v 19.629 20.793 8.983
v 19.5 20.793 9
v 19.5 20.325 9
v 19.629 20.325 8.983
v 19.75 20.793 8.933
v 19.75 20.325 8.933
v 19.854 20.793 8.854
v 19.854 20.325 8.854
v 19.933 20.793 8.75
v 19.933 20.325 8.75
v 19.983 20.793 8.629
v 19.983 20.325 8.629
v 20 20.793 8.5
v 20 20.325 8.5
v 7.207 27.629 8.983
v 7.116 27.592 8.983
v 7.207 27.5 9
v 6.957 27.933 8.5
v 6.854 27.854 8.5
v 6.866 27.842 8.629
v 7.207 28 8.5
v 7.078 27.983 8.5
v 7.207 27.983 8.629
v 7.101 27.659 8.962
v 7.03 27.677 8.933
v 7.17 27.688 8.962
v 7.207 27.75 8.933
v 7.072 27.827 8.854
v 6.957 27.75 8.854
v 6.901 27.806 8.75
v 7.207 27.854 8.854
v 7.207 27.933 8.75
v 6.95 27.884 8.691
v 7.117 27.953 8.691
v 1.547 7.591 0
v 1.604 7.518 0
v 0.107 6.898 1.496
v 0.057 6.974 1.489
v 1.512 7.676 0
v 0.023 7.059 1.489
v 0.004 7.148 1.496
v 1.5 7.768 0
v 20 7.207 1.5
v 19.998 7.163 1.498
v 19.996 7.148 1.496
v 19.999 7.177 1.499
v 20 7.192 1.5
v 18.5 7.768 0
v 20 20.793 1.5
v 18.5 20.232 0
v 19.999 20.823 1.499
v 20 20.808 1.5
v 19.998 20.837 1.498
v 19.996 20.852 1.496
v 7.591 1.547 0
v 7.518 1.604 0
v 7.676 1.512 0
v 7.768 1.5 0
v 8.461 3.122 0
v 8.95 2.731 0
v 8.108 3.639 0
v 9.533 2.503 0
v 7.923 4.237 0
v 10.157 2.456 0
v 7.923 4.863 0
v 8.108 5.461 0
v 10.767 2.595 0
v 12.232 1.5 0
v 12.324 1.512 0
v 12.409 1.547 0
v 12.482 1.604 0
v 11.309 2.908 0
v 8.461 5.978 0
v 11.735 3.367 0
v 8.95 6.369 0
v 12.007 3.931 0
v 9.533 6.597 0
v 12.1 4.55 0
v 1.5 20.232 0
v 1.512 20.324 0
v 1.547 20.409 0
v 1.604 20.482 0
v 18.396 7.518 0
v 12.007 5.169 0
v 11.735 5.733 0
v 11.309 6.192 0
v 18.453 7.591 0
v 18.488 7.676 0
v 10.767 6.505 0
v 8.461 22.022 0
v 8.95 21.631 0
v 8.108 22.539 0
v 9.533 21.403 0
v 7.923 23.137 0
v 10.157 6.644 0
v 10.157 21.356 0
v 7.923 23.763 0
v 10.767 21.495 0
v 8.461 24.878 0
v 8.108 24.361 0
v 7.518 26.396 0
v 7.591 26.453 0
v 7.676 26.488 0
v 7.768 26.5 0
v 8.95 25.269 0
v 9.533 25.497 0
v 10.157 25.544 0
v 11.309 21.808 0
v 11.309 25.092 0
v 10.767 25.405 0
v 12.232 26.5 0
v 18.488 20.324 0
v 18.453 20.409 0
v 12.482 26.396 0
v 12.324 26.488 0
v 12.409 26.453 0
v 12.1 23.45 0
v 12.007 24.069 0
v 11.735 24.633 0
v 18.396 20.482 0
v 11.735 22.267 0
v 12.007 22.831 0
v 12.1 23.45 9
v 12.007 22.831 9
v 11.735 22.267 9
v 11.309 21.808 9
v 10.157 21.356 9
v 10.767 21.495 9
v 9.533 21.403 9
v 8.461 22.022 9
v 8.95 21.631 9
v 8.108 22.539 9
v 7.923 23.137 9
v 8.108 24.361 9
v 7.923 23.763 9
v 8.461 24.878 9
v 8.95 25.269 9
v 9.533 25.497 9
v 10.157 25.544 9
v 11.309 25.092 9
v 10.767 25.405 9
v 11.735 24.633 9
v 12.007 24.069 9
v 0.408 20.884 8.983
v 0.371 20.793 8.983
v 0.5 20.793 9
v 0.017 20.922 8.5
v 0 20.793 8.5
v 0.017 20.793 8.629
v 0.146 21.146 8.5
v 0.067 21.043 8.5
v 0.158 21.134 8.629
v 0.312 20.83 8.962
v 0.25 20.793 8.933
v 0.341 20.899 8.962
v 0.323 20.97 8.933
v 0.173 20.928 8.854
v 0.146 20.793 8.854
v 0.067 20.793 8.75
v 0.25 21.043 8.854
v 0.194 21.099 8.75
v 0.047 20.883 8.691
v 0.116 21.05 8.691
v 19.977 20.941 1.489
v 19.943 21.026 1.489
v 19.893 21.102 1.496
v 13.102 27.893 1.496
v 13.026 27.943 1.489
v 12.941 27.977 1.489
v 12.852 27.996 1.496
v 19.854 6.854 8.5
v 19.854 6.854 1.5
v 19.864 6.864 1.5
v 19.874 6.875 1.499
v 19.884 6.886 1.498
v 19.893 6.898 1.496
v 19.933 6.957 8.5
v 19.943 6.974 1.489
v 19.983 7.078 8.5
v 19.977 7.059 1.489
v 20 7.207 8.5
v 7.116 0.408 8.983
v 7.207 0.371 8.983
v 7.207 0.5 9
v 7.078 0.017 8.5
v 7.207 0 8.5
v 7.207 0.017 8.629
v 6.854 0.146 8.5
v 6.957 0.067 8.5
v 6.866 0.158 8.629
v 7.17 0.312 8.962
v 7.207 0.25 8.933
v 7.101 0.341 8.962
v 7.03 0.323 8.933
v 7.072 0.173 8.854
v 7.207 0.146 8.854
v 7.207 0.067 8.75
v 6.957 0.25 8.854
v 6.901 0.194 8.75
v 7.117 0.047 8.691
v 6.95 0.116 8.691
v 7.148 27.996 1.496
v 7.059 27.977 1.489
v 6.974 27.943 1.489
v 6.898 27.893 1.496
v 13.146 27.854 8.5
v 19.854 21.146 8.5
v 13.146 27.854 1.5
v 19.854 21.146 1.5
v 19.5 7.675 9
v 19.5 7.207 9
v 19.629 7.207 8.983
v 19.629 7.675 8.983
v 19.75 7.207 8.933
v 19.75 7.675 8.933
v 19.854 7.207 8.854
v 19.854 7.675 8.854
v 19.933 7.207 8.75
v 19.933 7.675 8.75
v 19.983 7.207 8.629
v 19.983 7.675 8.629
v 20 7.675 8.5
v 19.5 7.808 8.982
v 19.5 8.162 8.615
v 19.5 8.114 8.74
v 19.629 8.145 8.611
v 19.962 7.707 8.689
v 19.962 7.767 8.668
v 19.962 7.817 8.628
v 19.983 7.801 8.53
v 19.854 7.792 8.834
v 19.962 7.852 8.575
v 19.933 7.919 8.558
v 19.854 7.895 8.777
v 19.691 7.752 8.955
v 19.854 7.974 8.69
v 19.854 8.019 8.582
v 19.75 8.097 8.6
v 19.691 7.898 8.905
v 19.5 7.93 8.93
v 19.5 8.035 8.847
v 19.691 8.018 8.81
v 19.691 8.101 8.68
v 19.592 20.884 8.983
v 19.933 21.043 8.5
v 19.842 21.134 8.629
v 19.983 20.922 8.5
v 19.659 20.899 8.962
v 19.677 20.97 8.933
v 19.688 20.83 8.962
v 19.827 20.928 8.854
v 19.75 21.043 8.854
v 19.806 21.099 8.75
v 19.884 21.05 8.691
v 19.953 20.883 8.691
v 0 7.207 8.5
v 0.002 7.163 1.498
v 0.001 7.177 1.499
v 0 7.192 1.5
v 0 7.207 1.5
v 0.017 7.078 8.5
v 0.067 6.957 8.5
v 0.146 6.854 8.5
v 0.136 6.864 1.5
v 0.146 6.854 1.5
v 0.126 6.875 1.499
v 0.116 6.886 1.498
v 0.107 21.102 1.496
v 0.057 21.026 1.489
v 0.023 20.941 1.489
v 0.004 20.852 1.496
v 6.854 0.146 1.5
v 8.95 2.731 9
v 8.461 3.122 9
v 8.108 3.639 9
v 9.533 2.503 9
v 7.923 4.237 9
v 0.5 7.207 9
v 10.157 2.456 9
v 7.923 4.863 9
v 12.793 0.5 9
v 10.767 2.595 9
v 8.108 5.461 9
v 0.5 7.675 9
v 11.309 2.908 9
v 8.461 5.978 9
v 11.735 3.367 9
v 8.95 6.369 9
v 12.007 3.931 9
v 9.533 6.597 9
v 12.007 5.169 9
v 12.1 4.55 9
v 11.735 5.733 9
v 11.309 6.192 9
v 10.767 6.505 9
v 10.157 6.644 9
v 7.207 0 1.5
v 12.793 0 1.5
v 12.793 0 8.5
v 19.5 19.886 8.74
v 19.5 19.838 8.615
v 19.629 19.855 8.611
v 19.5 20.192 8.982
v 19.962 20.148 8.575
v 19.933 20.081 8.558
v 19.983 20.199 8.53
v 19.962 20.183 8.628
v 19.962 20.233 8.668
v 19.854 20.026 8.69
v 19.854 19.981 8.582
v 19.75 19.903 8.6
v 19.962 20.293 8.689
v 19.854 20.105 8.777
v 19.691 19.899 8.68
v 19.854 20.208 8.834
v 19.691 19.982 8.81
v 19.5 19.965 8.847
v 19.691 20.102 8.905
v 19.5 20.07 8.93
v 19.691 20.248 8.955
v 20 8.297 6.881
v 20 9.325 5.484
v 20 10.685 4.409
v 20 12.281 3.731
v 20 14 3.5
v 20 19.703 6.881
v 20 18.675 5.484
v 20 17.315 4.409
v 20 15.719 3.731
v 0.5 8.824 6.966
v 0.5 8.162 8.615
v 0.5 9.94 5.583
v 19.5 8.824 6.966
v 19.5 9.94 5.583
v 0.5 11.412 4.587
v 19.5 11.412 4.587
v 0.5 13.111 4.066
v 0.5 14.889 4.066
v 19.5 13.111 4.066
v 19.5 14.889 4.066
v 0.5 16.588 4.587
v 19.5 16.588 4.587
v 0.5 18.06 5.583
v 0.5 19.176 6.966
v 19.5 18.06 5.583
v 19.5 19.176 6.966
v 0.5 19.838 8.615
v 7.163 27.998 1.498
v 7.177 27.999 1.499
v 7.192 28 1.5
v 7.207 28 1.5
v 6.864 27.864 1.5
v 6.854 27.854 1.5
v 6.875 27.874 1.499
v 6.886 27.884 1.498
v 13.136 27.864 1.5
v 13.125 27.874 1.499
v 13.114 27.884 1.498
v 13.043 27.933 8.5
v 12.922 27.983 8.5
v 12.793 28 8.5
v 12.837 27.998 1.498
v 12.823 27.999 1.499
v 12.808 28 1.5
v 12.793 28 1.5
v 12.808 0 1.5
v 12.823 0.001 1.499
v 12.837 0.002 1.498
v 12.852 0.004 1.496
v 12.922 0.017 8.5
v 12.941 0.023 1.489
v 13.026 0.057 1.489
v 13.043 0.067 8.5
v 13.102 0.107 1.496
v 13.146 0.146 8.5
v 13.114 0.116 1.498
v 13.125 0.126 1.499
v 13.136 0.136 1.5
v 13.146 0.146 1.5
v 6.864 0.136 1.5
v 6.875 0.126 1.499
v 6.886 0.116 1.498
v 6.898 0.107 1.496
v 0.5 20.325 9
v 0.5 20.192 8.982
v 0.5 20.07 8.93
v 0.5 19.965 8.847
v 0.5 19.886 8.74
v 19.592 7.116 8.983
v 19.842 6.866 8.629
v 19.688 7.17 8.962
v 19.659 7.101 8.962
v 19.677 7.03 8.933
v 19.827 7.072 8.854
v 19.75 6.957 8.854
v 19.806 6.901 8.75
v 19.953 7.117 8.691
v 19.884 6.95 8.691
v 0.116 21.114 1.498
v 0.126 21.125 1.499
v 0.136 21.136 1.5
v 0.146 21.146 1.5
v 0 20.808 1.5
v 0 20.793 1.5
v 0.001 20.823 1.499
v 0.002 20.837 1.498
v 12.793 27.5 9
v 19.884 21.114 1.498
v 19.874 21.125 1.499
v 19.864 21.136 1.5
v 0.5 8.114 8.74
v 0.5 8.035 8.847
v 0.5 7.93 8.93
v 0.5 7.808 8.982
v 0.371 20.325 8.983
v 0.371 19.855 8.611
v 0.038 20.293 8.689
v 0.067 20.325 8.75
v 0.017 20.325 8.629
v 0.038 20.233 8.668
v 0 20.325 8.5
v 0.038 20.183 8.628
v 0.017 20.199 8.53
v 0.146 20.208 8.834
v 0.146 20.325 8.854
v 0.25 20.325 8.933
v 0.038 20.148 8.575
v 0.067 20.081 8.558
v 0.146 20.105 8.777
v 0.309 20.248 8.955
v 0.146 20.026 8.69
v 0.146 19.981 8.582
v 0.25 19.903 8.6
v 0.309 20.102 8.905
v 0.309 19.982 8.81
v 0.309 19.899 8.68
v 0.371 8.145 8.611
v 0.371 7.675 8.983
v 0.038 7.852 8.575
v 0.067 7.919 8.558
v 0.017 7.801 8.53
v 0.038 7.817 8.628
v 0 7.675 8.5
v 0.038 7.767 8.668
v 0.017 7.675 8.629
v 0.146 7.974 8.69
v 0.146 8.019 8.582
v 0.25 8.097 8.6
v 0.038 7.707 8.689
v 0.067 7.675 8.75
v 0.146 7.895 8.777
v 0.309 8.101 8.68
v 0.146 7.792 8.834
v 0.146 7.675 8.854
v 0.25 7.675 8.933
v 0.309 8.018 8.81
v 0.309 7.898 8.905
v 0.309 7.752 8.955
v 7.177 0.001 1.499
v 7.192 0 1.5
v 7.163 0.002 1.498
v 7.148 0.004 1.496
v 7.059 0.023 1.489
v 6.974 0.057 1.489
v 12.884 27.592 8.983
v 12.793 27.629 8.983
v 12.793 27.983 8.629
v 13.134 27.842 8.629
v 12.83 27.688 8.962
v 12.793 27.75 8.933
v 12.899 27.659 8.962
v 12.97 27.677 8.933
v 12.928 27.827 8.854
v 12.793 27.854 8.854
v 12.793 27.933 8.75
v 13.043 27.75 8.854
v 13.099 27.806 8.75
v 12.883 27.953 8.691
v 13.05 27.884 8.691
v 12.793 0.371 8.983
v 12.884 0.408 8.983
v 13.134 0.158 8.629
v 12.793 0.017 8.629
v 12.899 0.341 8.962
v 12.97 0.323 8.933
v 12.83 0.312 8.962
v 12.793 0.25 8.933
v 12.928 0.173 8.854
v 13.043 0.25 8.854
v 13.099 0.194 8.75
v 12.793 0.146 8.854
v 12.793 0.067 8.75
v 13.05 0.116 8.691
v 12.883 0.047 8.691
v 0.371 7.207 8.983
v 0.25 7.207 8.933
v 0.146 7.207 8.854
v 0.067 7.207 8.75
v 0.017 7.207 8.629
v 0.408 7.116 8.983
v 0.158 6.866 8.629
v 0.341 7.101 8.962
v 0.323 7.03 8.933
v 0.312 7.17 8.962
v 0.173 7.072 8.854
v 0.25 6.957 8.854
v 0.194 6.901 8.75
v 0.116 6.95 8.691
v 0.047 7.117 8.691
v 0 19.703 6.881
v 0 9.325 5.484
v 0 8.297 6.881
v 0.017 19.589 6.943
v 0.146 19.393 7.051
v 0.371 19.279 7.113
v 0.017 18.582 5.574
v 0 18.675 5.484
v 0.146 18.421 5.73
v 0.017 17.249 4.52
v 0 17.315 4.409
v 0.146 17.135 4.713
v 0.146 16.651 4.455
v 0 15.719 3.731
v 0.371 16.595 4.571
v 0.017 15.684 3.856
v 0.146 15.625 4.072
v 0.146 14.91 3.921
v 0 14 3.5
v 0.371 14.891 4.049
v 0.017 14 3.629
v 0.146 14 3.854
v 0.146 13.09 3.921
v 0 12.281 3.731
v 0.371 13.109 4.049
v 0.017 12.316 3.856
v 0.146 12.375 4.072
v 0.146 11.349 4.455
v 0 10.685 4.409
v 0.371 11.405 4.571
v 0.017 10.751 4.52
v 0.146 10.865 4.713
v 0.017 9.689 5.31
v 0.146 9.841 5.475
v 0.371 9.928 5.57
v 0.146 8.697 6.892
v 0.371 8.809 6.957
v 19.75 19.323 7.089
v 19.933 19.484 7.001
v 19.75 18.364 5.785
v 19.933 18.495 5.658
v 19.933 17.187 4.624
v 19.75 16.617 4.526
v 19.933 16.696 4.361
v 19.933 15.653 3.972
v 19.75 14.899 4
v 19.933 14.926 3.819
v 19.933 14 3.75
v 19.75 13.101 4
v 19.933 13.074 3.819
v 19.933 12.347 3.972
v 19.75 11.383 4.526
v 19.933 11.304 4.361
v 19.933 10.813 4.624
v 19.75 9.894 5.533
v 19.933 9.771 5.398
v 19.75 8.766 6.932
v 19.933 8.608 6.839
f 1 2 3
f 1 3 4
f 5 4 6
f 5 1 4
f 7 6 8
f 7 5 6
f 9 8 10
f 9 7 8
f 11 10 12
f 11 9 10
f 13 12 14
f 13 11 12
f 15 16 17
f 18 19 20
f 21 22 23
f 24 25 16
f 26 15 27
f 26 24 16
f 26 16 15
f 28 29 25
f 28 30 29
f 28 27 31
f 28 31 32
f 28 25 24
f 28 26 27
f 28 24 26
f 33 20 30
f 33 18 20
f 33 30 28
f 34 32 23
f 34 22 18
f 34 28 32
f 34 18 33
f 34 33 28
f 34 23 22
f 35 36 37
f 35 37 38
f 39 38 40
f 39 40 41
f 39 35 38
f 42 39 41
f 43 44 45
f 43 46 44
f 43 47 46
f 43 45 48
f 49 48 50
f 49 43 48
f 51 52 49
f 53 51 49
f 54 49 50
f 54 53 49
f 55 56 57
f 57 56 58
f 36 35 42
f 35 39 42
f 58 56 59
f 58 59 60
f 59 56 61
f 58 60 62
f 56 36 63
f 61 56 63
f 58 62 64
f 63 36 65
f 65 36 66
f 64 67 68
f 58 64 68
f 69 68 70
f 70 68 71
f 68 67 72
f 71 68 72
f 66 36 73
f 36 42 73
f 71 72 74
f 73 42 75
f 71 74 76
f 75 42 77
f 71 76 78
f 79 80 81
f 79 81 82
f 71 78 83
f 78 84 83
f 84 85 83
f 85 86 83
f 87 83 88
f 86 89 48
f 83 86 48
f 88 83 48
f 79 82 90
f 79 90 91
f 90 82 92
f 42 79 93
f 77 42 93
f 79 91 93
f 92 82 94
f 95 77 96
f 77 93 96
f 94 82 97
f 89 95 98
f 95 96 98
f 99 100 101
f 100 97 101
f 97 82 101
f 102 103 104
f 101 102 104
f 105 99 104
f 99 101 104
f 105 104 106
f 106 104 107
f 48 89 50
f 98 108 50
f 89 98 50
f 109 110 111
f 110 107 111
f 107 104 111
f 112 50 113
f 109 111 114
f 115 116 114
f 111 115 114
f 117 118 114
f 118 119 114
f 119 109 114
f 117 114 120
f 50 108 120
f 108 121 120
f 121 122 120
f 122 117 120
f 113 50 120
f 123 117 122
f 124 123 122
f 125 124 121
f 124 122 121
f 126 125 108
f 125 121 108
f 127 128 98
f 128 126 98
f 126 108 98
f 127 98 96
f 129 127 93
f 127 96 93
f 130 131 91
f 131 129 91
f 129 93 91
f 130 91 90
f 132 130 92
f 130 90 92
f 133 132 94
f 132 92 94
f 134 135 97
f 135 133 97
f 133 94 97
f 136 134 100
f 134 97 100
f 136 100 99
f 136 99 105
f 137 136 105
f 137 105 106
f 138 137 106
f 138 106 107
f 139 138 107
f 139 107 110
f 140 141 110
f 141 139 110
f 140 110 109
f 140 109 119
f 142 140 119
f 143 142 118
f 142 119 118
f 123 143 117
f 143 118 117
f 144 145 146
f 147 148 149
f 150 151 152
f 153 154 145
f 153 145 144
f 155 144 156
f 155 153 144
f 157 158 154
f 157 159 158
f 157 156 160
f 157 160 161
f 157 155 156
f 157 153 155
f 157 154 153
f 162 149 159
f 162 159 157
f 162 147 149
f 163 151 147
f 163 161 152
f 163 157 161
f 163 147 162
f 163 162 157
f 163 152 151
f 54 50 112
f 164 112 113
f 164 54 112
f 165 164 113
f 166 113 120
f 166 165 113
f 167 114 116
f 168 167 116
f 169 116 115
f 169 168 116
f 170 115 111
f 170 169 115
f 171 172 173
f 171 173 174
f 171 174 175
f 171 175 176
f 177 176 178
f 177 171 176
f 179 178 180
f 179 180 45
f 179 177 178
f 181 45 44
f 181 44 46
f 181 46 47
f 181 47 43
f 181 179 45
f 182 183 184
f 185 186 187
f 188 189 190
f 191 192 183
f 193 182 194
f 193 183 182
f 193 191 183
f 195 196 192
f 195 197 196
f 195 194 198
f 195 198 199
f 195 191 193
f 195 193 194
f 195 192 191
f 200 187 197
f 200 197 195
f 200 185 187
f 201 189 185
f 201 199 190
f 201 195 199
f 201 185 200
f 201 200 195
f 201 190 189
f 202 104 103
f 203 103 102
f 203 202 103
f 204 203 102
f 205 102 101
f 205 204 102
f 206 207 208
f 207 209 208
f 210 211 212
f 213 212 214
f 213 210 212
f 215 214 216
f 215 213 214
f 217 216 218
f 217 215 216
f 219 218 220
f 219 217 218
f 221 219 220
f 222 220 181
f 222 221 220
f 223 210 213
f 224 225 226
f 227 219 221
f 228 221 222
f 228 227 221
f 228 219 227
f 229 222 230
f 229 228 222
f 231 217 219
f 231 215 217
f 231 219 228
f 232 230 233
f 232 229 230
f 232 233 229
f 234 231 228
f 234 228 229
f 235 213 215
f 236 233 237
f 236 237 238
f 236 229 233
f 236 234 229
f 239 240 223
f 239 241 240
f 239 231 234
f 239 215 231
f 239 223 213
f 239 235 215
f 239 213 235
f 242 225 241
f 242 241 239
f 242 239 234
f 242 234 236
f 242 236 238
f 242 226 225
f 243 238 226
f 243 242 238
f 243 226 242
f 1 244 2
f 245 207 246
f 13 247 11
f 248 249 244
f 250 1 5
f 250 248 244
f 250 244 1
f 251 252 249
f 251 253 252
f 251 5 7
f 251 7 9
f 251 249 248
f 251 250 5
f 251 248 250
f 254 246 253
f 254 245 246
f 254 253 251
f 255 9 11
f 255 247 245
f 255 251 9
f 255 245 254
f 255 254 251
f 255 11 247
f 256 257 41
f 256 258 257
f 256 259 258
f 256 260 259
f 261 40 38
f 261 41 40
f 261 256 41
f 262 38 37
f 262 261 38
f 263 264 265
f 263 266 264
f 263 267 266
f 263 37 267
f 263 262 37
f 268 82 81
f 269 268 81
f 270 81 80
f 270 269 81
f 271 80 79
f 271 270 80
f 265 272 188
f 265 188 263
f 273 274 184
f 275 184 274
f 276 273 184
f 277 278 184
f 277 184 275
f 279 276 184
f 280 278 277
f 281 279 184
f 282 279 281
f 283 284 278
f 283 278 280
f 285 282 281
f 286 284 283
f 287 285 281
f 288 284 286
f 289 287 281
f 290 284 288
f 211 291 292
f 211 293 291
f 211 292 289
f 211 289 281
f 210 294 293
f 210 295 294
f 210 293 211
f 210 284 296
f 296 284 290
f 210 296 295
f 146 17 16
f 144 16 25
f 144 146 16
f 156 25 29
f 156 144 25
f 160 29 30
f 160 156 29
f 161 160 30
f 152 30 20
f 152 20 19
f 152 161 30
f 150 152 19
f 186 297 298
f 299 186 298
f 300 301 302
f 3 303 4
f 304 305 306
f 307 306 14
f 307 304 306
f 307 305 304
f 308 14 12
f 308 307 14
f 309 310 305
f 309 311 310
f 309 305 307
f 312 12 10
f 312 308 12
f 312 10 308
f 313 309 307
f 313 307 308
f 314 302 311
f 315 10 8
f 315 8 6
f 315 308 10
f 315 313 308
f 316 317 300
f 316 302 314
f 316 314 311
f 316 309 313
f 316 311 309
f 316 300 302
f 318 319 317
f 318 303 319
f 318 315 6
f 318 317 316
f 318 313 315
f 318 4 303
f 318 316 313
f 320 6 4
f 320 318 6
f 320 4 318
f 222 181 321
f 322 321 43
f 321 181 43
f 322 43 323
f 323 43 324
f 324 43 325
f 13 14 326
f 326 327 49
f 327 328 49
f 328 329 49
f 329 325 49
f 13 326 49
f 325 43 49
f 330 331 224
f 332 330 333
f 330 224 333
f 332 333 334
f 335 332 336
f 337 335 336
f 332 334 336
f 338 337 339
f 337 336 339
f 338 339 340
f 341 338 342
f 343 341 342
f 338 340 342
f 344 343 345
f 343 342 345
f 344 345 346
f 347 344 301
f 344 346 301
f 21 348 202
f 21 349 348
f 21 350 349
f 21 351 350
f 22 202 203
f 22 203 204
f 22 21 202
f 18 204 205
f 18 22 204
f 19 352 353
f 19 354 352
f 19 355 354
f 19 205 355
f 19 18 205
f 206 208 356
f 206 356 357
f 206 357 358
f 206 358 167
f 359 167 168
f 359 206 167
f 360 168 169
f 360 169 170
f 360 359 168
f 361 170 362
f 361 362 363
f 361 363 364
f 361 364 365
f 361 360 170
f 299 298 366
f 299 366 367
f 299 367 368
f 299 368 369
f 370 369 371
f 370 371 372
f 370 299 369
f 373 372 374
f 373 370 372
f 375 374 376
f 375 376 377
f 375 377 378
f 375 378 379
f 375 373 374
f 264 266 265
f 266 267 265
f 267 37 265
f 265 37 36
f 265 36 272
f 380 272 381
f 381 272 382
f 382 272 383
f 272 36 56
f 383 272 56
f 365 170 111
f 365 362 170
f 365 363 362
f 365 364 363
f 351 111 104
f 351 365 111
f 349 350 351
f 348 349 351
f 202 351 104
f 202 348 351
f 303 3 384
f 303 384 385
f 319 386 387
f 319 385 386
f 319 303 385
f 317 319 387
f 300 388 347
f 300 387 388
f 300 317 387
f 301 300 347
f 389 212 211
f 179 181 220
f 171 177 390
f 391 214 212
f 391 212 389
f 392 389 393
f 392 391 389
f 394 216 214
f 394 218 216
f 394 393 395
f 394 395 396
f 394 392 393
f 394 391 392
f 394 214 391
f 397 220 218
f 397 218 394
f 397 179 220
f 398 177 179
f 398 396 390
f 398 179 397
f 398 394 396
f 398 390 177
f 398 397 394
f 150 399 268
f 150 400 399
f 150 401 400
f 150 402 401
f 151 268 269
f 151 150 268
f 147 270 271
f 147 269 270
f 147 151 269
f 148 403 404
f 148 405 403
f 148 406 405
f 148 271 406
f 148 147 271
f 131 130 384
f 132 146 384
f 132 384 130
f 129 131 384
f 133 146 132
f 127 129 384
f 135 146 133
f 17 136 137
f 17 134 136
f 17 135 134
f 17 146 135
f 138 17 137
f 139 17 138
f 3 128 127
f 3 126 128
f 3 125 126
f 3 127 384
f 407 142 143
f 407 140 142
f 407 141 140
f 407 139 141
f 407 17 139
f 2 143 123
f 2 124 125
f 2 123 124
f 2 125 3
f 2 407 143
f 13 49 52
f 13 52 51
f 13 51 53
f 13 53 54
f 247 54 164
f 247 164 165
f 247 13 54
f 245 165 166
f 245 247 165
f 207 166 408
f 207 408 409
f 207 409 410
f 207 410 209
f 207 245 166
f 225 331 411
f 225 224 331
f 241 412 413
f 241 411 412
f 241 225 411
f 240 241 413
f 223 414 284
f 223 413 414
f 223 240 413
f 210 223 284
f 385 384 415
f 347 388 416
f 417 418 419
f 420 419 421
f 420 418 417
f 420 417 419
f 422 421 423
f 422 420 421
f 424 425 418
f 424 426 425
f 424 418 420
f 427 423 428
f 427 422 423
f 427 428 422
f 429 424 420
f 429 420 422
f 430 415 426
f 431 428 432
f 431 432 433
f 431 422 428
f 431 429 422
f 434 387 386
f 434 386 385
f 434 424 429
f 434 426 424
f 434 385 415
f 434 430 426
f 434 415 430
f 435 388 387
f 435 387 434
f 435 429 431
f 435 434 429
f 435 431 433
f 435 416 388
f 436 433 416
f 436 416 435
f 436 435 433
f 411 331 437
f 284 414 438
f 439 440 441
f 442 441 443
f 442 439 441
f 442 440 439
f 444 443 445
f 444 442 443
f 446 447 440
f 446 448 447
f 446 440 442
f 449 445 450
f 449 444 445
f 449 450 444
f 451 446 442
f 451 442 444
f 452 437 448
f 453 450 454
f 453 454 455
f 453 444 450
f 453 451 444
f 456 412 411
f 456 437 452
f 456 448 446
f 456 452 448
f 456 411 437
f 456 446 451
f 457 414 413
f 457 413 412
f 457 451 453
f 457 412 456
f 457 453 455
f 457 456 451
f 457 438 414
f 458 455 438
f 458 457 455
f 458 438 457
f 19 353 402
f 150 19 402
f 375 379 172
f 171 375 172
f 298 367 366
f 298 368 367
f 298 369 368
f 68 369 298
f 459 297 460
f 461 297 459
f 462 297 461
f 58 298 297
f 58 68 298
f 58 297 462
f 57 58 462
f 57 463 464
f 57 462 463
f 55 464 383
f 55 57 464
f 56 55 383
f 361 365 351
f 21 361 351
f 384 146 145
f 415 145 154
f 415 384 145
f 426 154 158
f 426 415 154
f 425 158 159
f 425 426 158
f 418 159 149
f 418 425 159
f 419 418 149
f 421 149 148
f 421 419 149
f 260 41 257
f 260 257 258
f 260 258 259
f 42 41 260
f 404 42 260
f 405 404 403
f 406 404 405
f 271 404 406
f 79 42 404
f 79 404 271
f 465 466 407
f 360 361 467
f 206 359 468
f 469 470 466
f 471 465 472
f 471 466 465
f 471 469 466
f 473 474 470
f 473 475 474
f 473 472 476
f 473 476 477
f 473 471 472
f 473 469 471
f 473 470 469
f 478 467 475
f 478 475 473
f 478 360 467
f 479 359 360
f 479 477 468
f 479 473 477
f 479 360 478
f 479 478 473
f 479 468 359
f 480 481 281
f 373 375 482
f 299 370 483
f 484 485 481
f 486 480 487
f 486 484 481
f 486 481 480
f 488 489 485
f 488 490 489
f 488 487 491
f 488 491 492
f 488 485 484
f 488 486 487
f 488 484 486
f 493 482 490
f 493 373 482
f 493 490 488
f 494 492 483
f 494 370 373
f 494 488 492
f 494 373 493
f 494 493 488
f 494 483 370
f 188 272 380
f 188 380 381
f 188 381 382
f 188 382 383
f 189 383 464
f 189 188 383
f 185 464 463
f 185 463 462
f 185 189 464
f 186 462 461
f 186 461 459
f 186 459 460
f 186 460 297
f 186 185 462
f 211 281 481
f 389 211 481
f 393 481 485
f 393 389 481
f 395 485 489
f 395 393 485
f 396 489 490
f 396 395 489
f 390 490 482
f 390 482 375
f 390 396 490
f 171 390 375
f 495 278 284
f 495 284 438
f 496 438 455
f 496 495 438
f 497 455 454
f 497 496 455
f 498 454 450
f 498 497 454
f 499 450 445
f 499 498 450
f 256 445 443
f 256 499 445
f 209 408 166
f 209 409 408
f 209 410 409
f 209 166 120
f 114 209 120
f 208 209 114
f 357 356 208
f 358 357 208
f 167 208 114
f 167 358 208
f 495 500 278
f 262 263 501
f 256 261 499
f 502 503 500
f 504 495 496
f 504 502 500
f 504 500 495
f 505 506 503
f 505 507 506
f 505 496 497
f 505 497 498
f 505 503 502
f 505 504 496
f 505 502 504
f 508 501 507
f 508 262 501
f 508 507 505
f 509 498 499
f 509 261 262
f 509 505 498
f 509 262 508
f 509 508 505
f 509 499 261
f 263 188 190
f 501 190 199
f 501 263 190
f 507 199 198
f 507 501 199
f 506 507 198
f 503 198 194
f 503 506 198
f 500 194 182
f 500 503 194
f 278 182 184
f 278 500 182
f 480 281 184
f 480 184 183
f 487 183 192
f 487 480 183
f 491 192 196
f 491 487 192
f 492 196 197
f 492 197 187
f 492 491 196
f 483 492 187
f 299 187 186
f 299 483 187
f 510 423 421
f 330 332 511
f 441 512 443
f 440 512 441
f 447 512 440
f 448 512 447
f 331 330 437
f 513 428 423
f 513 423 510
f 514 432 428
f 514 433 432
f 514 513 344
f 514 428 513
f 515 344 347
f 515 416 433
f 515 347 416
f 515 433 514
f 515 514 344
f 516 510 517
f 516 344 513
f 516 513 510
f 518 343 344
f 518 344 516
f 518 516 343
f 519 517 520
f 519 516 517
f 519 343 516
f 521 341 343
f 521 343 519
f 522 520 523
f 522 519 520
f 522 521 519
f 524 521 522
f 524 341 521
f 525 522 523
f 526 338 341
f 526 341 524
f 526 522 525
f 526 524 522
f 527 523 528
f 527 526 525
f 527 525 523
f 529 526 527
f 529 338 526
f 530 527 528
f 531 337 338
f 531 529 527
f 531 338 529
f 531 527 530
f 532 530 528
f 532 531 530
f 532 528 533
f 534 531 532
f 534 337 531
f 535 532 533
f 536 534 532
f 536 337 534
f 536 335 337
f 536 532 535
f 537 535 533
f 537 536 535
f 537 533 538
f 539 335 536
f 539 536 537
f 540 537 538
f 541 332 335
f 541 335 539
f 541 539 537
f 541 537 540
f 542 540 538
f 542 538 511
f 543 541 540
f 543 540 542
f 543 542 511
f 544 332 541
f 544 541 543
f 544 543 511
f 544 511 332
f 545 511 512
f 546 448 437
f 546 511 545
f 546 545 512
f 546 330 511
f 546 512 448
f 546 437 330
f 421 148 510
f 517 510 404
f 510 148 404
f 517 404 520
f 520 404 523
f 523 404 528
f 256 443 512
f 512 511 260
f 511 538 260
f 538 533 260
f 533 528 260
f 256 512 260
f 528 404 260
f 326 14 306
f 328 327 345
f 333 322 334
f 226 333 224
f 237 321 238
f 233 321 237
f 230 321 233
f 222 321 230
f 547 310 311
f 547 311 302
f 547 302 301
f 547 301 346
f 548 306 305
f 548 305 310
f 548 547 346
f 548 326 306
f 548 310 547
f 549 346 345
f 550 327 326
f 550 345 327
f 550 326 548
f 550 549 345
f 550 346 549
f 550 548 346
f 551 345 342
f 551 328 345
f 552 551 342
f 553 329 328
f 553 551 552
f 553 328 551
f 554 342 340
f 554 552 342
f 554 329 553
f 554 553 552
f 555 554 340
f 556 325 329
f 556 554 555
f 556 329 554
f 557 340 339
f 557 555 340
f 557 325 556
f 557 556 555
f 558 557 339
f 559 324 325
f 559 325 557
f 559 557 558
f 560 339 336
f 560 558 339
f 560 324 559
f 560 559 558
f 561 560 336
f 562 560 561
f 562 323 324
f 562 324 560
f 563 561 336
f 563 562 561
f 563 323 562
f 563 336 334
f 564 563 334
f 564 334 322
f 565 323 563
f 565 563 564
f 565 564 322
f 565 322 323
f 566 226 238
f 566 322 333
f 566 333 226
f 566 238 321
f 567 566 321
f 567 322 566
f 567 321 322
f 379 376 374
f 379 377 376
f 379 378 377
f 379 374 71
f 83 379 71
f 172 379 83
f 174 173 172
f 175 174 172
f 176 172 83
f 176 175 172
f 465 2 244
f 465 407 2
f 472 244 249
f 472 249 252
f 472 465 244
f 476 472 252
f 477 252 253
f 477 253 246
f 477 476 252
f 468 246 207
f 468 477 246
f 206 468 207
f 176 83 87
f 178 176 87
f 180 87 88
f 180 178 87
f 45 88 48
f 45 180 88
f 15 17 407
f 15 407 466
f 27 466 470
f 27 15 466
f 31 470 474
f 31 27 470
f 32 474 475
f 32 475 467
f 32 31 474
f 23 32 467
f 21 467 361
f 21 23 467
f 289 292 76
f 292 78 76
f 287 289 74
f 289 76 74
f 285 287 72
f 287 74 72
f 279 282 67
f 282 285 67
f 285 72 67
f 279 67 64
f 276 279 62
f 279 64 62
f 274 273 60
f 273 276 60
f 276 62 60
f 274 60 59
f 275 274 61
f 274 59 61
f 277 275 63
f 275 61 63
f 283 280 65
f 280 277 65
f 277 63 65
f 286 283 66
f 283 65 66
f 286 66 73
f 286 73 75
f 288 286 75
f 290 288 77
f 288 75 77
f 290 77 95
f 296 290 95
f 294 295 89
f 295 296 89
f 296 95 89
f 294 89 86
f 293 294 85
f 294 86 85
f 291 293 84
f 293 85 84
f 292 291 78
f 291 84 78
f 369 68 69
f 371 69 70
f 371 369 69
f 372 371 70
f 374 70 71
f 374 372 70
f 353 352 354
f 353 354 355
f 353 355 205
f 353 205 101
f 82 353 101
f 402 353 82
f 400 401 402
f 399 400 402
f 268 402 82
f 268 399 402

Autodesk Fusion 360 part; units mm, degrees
sketch "Esquisse1" plane through (0, 0, 0) normal (0, 0, 1) x (1, 0, 0)
  line L0 (7, 0) -> (13, 0)
  line L1 (20, 7) -> (20, 21)
  line L2 (13, 28) -> (7, 28)
  line L3 (0, 21) -> (0, 7)
  line L4 (10, 28) -> (10, 0) construction
  circle A0 centre (10, 23.45) radius 2.1
  circle A1 centre (10, 4.55) radius 2.1
  line L5 (-6, 20) -> (25, 20) construction
  line L6 (25, 20) -> (25, 8) construction
  line L7 (25, 8) -> (-6, 8) construction
  line L8 (-6, 8) -> (-6, 20) construction
  line L9 (13, 0) -> (20, 7)
  line L10 (7, 0) -> (0, 7)
  line L11 (20, 21) -> (13, 28)
  line L12 (7, 28) -> (0, 21)
  point P0 (20, 0)
  point P1 (20, 28)
  point P2 (0, 28)
  dimension "d1" = 20
  dimension "d2" = 28
  dimension "d3" = 4.2
  dimension "d4" = 4.2
  dimension "d5" = 18.9
  dimension "d6" = 4.55
  dimension "d7" = 12
  dimension "d8" = 8
  dimension "d9" = 7
  dimension "d10" = 7
  dimension "d11" = 7
  dimension "d12" = 7
  dimension "d13" = 7
  dimension "d14" = 7
  dimension "d15" = 7
  dimension "d16" = 7
extrude "Extrusion1" add sketch "Esquisse1" along normal blind 9
sketch "Esquisse2" plane through (20, 0, 0) normal (1, 0, 0) x (0, 1, 0)
  line L0 (7, 0) -> (21, 0)
  line L1 (21, 0) -> (21, 9)
  line L2 (21, 9) -> (7, 9)
  line L3 (7, 9) -> (7, 0)
  circle A0 centre (14, 10) radius 6
  dimension "d19" = 12
  dimension "d20" = 10
  dimension "d21" = 7
extrude "Extrusion2" cut sketch "Esquisse2" against normal blind 20 contours L2 A0 | L2 A0
chamfer "Chanfrein1" distance 1.5 angle 45 8 edges at (16.5, 3.5, 0) (20, 14, 0) (16.5, 24.5, 0) (10, 28, 0) (3.5, 24.5, 0) (0, 14, 0) (3.5, 3.5, 0) (10, 0, 0)
fillet "Congé1" radius 0.5 22 edges at (10, 8.0839, 9) (10, 19.9161, 9) (0, 21, 5.25) (0, 7, 5.25) (0, 7.542, 9) (7, 0, 5.25) (13, 0, 5.25) (20, 7, 5.25) (20, 7.542, 9) (20, 14, 4) (0, 14, 4) (3.5, 24.5, 9) (10, 28, 9) (16.5, 24.5, 9) (20, 20.458, 9) (0, 20.458, 9) (20, 21, 5.25) (13, 28, 5.25) (7, 28, 5.25) (16.5, 3.5, 9) (10, 0, 9) (3.5, 3.5, 9)
fillet "Congé2" radius 0.5 8 edges at (0.769, 7.3185, 0.731) (7.3185, 0.769, 0.731) (12.6815, 0.769, 0.731) (0.769, 20.6815, 0.731) (7.3185, 27.231, 0.731) (12.6815, 27.231, 0.731) (19.231, 20.6815, 0.731) (19.231, 7.3185, 0.731)
equation "d5 = 14.7 mm + 4.2 mm"
equation "d6 = ( ( 28 - 18.9 ) / 2 ) * 1 mm"
equation "d10 = d9"
equation "d12 = d11"
equation "d14 = d13"
equation "d16 = d15"
